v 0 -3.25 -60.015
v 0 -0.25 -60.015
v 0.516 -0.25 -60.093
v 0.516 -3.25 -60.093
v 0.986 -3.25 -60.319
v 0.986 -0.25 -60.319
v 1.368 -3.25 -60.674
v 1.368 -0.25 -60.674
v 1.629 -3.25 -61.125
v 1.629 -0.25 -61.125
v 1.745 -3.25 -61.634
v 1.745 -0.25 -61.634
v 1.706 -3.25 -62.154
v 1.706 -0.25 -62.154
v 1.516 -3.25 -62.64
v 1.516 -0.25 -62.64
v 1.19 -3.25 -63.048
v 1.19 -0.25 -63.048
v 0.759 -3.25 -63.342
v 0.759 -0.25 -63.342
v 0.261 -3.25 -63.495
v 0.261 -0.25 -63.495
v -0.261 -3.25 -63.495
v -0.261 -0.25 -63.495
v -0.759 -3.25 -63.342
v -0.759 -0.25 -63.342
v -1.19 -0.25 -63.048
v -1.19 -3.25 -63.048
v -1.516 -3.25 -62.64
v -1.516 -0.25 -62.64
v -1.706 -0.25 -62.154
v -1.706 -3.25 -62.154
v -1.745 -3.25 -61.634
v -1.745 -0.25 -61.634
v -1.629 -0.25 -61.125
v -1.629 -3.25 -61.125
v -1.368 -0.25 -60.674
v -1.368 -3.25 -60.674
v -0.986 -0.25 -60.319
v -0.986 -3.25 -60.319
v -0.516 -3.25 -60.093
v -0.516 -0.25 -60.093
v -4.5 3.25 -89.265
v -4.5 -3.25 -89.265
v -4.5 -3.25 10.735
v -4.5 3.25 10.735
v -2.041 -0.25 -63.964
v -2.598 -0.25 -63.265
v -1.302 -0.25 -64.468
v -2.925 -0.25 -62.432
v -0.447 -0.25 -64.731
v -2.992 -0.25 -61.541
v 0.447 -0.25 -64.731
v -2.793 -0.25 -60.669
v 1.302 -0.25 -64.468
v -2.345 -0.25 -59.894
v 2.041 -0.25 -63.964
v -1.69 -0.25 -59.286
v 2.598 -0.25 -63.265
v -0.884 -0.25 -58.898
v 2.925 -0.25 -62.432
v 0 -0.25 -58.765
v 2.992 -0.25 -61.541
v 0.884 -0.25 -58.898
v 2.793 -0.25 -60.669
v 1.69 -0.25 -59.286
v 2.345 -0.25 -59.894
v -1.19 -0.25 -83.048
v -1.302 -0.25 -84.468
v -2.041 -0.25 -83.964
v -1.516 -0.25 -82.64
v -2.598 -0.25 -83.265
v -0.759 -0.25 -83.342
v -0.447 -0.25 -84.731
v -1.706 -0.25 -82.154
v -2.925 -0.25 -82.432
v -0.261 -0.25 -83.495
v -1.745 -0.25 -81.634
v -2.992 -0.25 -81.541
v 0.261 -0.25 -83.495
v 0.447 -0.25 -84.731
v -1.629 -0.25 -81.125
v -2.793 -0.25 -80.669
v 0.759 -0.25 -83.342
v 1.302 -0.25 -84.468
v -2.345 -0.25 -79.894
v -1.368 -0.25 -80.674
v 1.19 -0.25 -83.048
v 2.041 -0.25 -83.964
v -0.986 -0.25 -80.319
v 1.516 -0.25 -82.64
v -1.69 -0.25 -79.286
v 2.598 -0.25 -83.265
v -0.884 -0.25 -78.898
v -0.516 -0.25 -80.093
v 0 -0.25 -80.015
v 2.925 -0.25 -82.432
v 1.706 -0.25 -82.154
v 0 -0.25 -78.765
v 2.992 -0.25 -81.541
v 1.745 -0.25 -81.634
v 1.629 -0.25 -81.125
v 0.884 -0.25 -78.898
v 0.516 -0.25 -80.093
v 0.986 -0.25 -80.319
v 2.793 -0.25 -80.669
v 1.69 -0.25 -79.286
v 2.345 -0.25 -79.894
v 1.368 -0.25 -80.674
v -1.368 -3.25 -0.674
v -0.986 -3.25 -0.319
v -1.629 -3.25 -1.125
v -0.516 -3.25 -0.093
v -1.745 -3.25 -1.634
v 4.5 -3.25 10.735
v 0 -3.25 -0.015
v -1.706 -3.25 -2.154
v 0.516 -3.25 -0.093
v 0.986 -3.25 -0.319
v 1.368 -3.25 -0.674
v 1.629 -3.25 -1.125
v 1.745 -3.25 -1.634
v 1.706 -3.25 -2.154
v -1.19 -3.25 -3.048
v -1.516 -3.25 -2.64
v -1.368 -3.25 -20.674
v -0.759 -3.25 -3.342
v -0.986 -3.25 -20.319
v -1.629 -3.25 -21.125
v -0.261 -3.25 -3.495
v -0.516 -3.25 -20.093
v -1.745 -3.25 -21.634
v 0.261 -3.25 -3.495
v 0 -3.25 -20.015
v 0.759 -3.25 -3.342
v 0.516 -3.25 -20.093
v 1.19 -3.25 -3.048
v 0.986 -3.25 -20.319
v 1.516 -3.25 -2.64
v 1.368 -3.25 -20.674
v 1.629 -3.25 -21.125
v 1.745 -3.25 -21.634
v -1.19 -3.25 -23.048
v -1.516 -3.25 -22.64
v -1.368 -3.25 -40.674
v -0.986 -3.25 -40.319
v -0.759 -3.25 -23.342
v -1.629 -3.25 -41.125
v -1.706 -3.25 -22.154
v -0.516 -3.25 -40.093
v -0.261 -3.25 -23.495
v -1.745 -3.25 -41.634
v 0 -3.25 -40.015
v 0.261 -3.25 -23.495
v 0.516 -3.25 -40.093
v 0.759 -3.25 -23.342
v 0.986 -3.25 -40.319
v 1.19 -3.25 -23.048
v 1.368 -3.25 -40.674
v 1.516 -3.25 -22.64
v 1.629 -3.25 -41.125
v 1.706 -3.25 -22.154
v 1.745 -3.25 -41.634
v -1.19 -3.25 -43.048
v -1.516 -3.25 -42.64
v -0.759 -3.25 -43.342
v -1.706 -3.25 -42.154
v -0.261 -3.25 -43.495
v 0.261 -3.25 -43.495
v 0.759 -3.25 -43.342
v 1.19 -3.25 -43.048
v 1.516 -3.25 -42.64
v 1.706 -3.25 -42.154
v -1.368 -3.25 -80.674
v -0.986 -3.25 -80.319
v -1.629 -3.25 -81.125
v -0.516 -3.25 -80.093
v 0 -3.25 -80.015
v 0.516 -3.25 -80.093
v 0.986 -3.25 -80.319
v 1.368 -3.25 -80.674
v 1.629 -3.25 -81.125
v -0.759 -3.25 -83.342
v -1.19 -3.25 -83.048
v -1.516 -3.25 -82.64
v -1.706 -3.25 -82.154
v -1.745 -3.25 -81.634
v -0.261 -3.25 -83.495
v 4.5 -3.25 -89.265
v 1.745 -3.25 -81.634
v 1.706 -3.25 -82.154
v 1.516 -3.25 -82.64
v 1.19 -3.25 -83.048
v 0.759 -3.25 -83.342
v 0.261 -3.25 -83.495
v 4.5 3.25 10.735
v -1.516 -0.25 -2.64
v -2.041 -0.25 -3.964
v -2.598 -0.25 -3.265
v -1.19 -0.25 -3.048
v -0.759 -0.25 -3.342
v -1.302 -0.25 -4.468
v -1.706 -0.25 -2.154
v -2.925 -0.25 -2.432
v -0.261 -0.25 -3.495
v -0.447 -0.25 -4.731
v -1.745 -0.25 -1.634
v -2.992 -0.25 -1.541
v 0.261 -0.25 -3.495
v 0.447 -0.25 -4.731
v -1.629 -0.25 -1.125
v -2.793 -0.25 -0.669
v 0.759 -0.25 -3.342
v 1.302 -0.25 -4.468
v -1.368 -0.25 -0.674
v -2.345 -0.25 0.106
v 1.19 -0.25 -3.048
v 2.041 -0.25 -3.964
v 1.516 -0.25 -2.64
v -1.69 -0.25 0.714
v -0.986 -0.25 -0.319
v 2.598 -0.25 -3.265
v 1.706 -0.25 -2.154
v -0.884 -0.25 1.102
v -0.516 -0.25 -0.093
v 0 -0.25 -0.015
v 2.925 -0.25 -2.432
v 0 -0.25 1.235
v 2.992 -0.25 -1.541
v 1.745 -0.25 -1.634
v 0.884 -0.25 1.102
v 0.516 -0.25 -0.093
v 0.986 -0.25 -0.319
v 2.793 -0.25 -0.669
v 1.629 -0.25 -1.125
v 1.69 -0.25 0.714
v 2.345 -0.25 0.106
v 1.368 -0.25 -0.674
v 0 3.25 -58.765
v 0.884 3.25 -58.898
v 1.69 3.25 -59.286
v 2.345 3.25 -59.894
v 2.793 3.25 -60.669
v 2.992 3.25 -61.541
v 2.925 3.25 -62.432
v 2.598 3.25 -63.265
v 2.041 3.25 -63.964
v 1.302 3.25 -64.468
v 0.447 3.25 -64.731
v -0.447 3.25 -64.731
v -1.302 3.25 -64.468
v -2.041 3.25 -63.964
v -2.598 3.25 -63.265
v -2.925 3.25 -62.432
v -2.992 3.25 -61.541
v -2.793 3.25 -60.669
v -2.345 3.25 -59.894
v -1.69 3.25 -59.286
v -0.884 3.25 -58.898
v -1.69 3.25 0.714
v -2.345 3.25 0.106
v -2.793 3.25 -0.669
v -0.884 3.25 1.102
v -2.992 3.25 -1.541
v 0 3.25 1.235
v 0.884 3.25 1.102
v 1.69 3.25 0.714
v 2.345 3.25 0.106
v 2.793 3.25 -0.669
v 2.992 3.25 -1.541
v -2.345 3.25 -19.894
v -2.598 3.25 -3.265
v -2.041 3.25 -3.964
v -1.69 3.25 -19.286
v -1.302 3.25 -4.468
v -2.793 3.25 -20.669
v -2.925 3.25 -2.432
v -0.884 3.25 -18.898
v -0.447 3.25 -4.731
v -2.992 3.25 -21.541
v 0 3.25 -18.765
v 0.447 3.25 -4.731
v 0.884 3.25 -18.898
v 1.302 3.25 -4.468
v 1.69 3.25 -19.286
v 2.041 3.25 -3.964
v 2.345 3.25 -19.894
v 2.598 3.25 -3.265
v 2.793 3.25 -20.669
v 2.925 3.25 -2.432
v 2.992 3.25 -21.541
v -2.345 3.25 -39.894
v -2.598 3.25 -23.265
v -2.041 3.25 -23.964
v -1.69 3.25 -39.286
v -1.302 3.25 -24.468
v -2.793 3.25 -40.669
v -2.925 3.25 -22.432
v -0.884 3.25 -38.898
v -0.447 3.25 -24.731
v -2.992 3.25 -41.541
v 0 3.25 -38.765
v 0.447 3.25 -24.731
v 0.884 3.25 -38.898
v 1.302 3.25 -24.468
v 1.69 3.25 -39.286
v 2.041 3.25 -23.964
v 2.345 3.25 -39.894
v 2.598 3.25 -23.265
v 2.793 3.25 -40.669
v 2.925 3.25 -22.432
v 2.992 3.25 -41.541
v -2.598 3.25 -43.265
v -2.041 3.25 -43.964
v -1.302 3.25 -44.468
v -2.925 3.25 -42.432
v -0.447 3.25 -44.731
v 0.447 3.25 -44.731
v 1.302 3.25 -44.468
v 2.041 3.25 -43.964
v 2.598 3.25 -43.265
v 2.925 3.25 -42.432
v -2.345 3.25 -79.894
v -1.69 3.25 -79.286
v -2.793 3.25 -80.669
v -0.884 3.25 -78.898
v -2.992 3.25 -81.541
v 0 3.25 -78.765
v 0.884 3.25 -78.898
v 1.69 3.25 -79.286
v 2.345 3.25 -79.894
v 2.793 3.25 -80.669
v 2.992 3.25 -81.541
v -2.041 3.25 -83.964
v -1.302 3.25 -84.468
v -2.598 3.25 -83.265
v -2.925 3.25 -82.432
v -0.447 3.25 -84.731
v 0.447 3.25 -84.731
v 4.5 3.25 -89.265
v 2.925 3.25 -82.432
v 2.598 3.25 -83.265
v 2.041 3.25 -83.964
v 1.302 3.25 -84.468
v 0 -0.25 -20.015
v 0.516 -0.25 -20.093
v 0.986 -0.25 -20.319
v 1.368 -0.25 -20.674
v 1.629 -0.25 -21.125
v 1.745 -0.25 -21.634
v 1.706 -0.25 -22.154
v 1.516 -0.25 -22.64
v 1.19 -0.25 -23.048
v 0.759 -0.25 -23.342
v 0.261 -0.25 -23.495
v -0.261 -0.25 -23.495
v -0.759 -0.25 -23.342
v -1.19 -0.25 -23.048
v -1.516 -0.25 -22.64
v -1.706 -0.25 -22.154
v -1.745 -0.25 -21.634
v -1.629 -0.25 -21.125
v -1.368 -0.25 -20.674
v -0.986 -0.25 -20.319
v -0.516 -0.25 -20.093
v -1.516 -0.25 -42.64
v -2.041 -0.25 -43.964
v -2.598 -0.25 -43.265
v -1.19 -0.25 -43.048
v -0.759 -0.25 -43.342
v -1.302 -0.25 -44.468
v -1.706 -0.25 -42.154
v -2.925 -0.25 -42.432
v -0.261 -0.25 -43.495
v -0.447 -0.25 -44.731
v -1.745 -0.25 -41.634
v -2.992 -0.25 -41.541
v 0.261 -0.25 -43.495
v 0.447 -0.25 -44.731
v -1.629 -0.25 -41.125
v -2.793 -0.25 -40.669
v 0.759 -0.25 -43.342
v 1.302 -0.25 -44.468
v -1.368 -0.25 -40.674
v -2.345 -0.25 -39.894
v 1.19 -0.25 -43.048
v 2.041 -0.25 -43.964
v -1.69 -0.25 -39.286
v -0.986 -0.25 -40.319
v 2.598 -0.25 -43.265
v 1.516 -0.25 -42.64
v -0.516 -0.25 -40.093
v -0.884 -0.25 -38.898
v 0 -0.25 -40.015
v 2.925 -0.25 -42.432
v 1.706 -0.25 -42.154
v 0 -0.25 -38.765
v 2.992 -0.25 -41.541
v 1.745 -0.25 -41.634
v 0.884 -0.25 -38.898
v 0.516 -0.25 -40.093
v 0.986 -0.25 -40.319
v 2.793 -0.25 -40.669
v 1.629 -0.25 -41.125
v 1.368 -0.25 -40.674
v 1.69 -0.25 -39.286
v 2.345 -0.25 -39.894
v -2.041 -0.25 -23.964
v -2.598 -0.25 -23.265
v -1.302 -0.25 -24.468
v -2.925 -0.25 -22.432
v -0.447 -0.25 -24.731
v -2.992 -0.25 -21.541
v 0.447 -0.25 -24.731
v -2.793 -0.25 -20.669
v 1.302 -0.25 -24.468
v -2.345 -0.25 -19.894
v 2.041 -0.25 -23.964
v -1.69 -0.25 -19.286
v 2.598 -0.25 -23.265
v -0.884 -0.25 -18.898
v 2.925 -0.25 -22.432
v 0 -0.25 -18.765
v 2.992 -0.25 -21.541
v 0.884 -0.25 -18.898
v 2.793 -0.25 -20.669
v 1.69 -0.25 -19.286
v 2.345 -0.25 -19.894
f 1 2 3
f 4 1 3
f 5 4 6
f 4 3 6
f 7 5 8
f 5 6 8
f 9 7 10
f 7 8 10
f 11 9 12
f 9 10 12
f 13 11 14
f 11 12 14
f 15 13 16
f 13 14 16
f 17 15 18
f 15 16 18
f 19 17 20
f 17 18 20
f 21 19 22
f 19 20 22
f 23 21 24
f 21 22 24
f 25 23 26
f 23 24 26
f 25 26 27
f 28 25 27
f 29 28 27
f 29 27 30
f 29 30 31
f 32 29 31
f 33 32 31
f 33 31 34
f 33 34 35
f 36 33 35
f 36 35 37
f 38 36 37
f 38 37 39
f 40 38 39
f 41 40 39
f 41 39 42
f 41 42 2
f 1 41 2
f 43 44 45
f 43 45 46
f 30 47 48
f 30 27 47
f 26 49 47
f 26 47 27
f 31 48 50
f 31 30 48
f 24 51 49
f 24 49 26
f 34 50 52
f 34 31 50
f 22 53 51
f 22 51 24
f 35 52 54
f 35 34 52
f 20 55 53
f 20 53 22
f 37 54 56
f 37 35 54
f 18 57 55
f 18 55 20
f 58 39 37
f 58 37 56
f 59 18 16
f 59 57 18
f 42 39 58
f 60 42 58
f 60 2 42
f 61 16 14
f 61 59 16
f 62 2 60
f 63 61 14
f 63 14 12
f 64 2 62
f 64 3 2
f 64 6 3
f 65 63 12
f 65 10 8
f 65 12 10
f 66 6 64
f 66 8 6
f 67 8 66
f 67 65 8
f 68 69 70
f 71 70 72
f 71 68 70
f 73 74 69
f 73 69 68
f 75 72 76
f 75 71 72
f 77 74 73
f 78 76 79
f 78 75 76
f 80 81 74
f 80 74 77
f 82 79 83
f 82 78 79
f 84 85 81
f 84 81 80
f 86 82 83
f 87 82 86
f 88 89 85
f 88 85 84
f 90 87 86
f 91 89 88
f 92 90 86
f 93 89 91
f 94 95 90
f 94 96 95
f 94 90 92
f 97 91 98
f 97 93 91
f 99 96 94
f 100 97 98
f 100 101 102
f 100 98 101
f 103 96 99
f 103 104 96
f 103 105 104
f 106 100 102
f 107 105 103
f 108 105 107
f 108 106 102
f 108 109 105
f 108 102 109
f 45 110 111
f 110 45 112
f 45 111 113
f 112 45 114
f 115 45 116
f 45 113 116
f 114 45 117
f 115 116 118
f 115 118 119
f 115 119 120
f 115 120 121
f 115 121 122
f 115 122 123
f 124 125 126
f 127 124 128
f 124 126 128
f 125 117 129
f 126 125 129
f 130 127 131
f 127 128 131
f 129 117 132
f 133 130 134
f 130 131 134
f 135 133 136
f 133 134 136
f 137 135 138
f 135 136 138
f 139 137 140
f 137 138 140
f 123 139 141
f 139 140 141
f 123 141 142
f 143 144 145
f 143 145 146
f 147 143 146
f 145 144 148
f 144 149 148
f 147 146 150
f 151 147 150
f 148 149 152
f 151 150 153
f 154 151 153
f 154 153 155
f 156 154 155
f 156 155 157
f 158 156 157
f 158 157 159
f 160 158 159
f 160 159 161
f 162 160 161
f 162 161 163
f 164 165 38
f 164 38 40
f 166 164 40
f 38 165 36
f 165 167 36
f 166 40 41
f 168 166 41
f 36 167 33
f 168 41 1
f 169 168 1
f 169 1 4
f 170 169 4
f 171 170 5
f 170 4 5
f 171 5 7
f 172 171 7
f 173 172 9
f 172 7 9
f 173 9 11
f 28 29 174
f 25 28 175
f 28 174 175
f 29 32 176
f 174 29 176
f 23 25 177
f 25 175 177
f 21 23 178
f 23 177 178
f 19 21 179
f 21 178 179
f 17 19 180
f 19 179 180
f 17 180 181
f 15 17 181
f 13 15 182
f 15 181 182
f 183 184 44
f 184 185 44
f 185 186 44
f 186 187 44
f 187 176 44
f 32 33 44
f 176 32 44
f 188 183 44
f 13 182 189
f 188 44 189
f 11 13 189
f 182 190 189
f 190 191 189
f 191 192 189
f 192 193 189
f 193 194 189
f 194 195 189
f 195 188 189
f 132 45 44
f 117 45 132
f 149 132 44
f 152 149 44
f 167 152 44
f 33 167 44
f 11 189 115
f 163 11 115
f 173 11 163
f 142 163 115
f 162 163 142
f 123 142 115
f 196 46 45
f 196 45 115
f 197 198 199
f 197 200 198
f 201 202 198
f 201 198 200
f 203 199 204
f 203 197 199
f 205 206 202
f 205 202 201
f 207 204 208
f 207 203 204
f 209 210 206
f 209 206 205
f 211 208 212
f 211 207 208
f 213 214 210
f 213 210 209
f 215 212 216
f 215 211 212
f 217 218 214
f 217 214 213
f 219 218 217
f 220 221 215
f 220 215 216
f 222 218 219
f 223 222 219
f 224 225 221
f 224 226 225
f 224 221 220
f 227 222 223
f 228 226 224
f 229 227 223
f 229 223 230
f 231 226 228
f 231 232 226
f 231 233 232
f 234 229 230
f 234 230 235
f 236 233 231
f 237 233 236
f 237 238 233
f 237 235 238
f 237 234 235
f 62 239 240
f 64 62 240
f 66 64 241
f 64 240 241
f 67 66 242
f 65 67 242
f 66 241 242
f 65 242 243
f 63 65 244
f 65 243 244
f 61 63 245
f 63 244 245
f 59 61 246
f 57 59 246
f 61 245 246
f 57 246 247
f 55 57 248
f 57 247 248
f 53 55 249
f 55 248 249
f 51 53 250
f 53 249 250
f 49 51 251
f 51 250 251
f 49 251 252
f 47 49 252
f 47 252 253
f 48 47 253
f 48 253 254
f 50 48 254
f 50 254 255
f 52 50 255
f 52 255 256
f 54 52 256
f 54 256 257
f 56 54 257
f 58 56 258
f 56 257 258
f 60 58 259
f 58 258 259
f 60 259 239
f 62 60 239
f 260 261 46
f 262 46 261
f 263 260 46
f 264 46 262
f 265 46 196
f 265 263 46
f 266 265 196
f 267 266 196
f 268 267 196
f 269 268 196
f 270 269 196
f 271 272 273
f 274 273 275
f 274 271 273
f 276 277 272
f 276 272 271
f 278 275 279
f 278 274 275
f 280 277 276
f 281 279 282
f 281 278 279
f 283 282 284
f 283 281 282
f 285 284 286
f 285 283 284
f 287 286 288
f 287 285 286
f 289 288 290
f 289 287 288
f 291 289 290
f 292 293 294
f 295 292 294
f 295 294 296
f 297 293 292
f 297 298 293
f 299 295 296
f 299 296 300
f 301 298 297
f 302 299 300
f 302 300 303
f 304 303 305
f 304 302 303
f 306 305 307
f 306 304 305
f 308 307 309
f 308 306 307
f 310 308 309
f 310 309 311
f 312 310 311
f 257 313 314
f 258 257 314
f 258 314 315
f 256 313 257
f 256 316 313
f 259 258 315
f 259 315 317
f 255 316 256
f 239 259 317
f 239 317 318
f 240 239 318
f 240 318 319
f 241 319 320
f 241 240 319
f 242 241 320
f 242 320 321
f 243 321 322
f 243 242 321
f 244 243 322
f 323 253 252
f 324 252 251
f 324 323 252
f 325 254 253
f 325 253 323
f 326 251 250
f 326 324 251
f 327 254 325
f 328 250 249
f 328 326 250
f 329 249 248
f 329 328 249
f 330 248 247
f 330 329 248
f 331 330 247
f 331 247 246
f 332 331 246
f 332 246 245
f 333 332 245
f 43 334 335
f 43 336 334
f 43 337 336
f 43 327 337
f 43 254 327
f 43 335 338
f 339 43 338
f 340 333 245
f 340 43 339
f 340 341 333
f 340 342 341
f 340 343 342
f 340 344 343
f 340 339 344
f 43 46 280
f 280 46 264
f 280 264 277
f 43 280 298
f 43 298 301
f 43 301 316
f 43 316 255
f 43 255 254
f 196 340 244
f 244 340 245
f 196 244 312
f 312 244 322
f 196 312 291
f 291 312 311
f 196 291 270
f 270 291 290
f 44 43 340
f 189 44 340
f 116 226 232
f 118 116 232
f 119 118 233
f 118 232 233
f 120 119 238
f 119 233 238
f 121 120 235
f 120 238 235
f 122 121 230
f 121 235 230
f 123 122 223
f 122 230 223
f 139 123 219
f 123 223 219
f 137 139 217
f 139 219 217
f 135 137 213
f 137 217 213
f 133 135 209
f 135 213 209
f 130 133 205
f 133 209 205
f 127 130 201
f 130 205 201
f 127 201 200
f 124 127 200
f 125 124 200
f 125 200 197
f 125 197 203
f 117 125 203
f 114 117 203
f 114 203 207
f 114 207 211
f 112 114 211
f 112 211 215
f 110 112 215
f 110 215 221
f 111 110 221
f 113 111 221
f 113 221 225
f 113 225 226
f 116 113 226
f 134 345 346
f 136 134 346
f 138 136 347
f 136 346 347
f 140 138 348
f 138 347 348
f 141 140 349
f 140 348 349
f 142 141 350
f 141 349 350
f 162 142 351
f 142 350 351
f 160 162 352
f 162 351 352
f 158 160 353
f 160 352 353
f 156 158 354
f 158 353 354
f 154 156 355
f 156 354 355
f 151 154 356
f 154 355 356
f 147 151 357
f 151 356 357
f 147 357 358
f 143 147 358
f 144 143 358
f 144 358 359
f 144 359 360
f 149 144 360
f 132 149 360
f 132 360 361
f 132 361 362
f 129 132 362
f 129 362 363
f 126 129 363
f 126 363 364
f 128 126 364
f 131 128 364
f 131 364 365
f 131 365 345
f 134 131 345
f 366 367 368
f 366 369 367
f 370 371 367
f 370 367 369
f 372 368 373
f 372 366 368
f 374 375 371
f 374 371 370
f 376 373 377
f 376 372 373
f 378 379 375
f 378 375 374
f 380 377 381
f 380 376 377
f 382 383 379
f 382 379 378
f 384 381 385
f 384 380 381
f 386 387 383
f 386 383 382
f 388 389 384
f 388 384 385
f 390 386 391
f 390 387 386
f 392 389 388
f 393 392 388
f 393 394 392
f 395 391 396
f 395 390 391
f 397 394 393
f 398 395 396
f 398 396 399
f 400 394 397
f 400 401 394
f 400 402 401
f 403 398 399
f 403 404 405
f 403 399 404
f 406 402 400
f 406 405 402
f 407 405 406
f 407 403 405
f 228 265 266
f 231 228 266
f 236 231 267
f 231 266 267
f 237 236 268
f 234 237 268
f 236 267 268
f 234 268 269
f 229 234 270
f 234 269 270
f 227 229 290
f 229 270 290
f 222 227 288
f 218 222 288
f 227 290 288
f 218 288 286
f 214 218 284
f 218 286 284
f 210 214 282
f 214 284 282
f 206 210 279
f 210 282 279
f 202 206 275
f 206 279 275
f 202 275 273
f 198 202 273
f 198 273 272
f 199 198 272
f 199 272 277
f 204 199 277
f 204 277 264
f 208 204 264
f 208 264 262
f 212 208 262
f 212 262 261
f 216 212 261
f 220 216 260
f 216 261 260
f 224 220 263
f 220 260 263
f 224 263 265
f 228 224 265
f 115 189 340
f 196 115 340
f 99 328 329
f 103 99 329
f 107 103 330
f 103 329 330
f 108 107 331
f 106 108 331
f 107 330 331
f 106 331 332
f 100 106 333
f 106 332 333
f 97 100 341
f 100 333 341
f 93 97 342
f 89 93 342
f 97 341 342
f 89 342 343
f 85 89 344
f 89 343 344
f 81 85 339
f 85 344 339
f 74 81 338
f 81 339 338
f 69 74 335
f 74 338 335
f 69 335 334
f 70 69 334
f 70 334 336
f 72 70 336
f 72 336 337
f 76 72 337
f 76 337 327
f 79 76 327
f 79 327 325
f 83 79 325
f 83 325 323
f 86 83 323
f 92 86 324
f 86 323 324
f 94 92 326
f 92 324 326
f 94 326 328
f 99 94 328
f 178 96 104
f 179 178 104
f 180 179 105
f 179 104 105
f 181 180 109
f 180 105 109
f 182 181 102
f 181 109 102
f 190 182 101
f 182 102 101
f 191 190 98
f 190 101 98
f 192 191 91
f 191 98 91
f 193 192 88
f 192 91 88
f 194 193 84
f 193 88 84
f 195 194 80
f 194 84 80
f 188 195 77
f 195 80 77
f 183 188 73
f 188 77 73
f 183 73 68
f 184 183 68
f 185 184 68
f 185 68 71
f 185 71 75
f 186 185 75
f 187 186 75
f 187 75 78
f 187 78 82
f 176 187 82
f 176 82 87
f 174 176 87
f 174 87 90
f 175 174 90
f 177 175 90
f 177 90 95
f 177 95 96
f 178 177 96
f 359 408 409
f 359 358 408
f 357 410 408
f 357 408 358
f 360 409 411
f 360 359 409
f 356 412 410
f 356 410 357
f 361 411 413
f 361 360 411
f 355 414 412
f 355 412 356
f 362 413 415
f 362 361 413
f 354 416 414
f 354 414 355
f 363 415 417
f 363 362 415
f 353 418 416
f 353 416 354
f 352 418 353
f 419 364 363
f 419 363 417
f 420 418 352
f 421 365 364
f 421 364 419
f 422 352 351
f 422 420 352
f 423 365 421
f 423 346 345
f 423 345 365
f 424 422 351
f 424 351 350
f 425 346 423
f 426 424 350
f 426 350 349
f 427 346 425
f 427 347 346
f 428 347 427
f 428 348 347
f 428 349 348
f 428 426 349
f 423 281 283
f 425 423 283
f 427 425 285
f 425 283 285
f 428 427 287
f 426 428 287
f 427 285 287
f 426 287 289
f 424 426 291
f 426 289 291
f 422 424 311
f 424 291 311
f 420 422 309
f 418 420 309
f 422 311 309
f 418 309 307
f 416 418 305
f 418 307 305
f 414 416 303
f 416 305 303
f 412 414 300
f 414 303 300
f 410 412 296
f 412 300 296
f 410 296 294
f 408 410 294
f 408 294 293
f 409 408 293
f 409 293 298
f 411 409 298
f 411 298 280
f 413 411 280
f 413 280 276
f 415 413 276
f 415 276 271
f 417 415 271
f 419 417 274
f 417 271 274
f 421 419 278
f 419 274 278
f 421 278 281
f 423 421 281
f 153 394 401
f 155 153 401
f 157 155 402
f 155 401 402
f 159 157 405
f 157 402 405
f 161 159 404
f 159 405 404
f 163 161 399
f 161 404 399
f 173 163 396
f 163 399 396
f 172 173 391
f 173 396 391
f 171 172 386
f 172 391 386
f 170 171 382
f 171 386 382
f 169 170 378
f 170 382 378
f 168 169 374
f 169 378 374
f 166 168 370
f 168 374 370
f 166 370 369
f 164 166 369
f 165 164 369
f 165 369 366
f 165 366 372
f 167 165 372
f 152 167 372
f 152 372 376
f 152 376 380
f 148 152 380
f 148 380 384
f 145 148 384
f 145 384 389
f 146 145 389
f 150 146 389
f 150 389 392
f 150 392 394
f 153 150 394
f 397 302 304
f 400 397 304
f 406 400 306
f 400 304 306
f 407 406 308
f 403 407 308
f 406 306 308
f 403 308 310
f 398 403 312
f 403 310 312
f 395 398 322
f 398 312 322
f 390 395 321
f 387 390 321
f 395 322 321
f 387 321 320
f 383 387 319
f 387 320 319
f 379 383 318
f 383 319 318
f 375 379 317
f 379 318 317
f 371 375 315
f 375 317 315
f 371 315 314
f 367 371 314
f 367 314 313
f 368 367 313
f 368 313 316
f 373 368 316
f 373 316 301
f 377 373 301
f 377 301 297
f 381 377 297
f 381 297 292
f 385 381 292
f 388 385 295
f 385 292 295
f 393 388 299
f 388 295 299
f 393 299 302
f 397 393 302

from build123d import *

# Parameters (mm, degrees)
SKETCH_1_W          = 9
SKETCH_1_H          = 6.5
EXTRUDE_1_DEPTH     = 100
SKETCH_2_R          = 1.750000006
CUT_EXTRUDE_1_DEPTH = 90.614230596
SKETCH_3_R          = 3.000000006
CUT_EXTRUDE_2_DEPTH = 3.5


with BuildPart() as part:
    # 草图1 → 凸台-拉伸1 (new body)
    with BuildSketch(Plane.XY.offset(-89.264832522)):
        Rectangle(SKETCH_1_W, SKETCH_1_H)
    extrude(amount=EXTRUDE_1_DEPTH)

    # 草图2 → 切除-拉伸1 (cut, through all)
    with BuildSketch(Plane(origin=(0, 3.25, 0), x_dir=(1, 0, 0), z_dir=(0, 1, 0))):
        with Locations(Location((0, 81.764832522, 0), (0, 0, 270))):
            Circle(SKETCH_2_R)
        with Locations(Location((0, 61.764832522, 0), (0, 0, 270))):
            Circle(SKETCH_2_R)
        with Locations(Location((0, 41.764832522, 0), (0, 0, 270))):
            Circle(SKETCH_2_R)
        with Locations(Location((0, 21.764832522, 0), (0, 0, 270))):
            Circle(SKETCH_2_R)
        with Locations(Location((0, 1.764832522, 0), (0, 0, 270))):
            Circle(SKETCH_2_R)
        with Locations((0, -18.235167478)):
            Circle(SKETCH_2_R)
        with Locations((0, -38.235167478)):
            Circle(SKETCH_2_R)
        with Locations((0, -58.235167478)):
            Circle(SKETCH_2_R)
        with Locations((0, -78.235167478)):
            Circle(SKETCH_2_R)
        with Locations((0, -98.235167478)):
            Circle(SKETCH_2_R)
        with Locations((0, -118.235167478)):
            Circle(SKETCH_2_R)
        with Locations((0, -138.235167478)):
            Circle(SKETCH_2_R)
        with Locations((0, -158.235167478)):
            Circle(SKETCH_2_R)
        with Locations((0, -178.235167478)):
            Circle(SKETCH_2_R)
        with Locations((0, -198.235167478)):
            Circle(SKETCH_2_R)
        with Locations((0, -218.235167478)):
            Circle(SKETCH_2_R)
        with Locations((0, -238.235167478)):
            Circle(SKETCH_2_R)
        with Locations((0, -258.235167478)):
            Circle(SKETCH_2_R)
        with Locations((0, -278.235167478)):
            Circle(SKETCH_2_R)
        with Locations((0, -298.235167478)):
            Circle(SKETCH_2_R)
        with Locations((0, -318.235167478)):
            Circle(SKETCH_2_R)
        with Locations((0, -338.235167478)):
            Circle(SKETCH_2_R)
        with Locations((0, -358.235167478)):
            Circle(SKETCH_2_R)
        with Locations((0, -378.235167478)):
            Circle(SKETCH_2_R)
        with Locations((0, -398.235167478)):
            Circle(SKETCH_2_R)
        with Locations((0, -418.235167478)):
            Circle(SKETCH_2_R)
        with Locations((0, -438.235167478)):
            Circle(SKETCH_2_R)
        with Locations((0, -458.235167478)):
            Circle(SKETCH_2_R)
        with Locations((0, -478.235167478)):
            Circle(SKETCH_2_R)
        with Locations((0, -498.235167478)):
            Circle(SKETCH_2_R)
        with Locations((0, -518.235167478)):
            Circle(SKETCH_2_R)
        with Locations((0, -538.235167478)):
            Circle(SKETCH_2_R)
        with Locations((0, -558.235167478)):
            Circle(SKETCH_2_R)
        with Locations((0, -578.235167478)):
            Circle(SKETCH_2_R)
        with Locations((0, -598.235167478)):
            Circle(SKETCH_2_R)
        with Locations((0, -618.235167478)):
            Circle(SKETCH_2_R)
        with Locations((0, -638.235167478)):
            Circle(SKETCH_2_R)
        with Locations((0, -658.235167478)):
            Circle(SKETCH_2_R)
        with Locations((0, -678.235167478)):
            Circle(SKETCH_2_R)
        with Locations((0, -698.235167478)):
            Circle(SKETCH_2_R)
        with Locations((0, -718.235167478)):
            Circle(SKETCH_2_R)
        with Locations((0, -738.235167478)):
            Circle(SKETCH_2_R)
        with Locations((0, -758.235167478)):
            Circle(SKETCH_2_R)
        with Locations((0, -778.235167478)):
            Circle(SKETCH_2_R)
        with Locations((0, -798.235167478)):
            Circle(SKETCH_2_R)
        with Locations((0, -818.235167478)):
            Circle(SKETCH_2_R)
        with Locations((0, -838.235167478)):
            Circle(SKETCH_2_R)
        with Locations((0, -858.235167478)):
            Circle(SKETCH_2_R)
        with Locations((0, -878.235167478)):
            Circle(SKETCH_2_R)
        with Locations((0, -898.235167478)):
            Circle(SKETCH_2_R)
        with Locations((0, -918.235167478)):
            Circle(SKETCH_2_R)
        with Locations((0, -938.235167478)):
            Circle(SKETCH_2_R)
        with Locations((0, -958.235167478)):
            Circle(SKETCH_2_R)
        with Locations((0, -978.235167478)):
            Circle(SKETCH_2_R)
        with Locations((0, -998.235167478)):
            Circle(SKETCH_2_R)
        with Locations((0, -1018.235167478)):
            Circle(SKETCH_2_R)
        with Locations((0, -1038.235167478)):
            Circle(SKETCH_2_R)
        with Locations((0, -1058.235167478)):
            Circle(SKETCH_2_R)
        with Locations((0, -1078.235167478)):
            Circle(SKETCH_2_R)
        with Locations((0, -1098.235167478)):
            Circle(SKETCH_2_R)
    extrude(amount=-CUT_EXTRUDE_1_DEPTH, mode=Mode.SUBTRACT)

    # 草图3 → 切除-拉伸2 (cut)
    with BuildSketch(Plane(origin=(0, 3.25, 0), x_dir=(1, 0, 0), z_dir=(0, 1, 0))):
        with Locations(Location((0, 81.764832522, 0), (0, 0, 270))):
            Circle(SKETCH_3_R)
        with Locations(Location((0, 61.764832522, 0), (0, 0, 270))):
            Circle(SKETCH_3_R)
        with Locations(Location((0, 41.764832522, 0), (0, 0, 270))):
            Circle(SKETCH_3_R)
        with Locations(Location((0, 21.764832522, 0), (0, 0, 270))):
            Circle(SKETCH_3_R)
        with Locations(Location((0, 1.764832522, 0), (0, 0, 270))):
            Circle(SKETCH_3_R)
        with Locations((0, -18.235167478)):
            Circle(SKETCH_3_R)
        with Locations((0, -38.235167478)):
            Circle(SKETCH_3_R)
        with Locations((0, -58.235167478)):
            Circle(SKETCH_3_R)
        with Locations((0, -78.235167478)):
            Circle(SKETCH_3_R)
        with Locations((0, -98.235167478)):
            Circle(SKETCH_3_R)
        with Locations((0, -118.235167478)):
            Circle(SKETCH_3_R)
        with Locations((0, -138.235167478)):
            Circle(SKETCH_3_R)
        with Locations((0, -158.235167478)):
            Circle(SKETCH_3_R)
        with Locations((0, -178.235167478)):
            Circle(SKETCH_3_R)
        with Locations((0, -198.235167478)):
            Circle(SKETCH_3_R)
        with Locations((0, -218.235167478)):
            Circle(SKETCH_3_R)
        with Locations((0, -238.235167478)):
            Circle(SKETCH_3_R)
        with Locations((0, -258.235167478)):
            Circle(SKETCH_3_R)
        with Locations((0, -278.235167478)):
            Circle(SKETCH_3_R)
        with Locations((0, -298.235167478)):
            Circle(SKETCH_3_R)
        with Locations((0, -318.235167478)):
            Circle(SKETCH_3_R)
        with Locations((0, -338.235167478)):
            Circle(SKETCH_3_R)
        with Locations((0, -358.235167478)):
            Circle(SKETCH_3_R)
        with Locations((0, -378.235167478)):
            Circle(SKETCH_3_R)
        with Locations((0, -398.235167478)):
            Circle(SKETCH_3_R)
        with Locations((0, -418.235167478)):
            Circle(SKETCH_3_R)
        with Locations((0, -438.235167478)):
            Circle(SKETCH_3_R)
        with Locations((0, -458.235167478)):
            Circle(SKETCH_3_R)
        with Locations((0, -478.235167478)):
            Circle(SKETCH_3_R)
        with Locations((0, -498.235167478)):
            Circle(SKETCH_3_R)
        with Locations((0, -518.235167478)):
            Circle(SKETCH_3_R)
        with Locations((0, -538.235167478)):
            Circle(SKETCH_3_R)
        with Locations((0, -558.235167478)):
            Circle(SKETCH_3_R)
        with Locations((0, -578.235167478)):
            Circle(SKETCH_3_R)
        with Locations((0, -598.235167478)):
            Circle(SKETCH_3_R)
        with Locations((0, -618.235167478)):
            Circle(SKETCH_3_R)
        with Locations((0, -638.235167478)):
            Circle(SKETCH_3_R)
        with Locations((0, -658.235167478)):
            Circle(SKETCH_3_R)
        with Locations((0, -678.235167478)):
            Circle(SKETCH_3_R)
        with Locations((0, -698.235167478)):
            Circle(SKETCH_3_R)
        with Locations((0, -718.235167478)):
            Circle(SKETCH_3_R)
        with Locations((0, -738.235167478)):
            Circle(SKETCH_3_R)
        with Locations((0, -758.235167478)):
            Circle(SKETCH_3_R)
        with Locations((0, -778.235167478)):
            Circle(SKETCH_3_R)
        with Locations((0, -798.235167478)):
            Circle(SKETCH_3_R)
        with Locations((0, -818.235167478)):
            Circle(SKETCH_3_R)
        with Locations((0, -838.235167478)):
            Circle(SKETCH_3_R)
        with Locations((0, -858.235167478)):
            Circle(SKETCH_3_R)
        with Locations((0, -878.235167478)):
            Circle(SKETCH_3_R)
        with Locations((0, -898.235167478)):
            Circle(SKETCH_3_R)
        with Locations((0, -918.235167478)):
            Circle(SKETCH_3_R)
        with Locations((0, -938.235167478)):
            Circle(SKETCH_3_R)
        with Locations((0, -958.235167478)):
            Circle(SKETCH_3_R)
        with Locations((0, -978.235167478)):
            Circle(SKETCH_3_R)
        with Locations((0, -998.235167478)):
            Circle(SKETCH_3_R)
        with Locations((0, -1018.235167478)):
            Circle(SKETCH_3_R)
        with Locations((0, -1038.235167478)):
            Circle(SKETCH_3_R)
        with Locations((0, -1058.235167478)):
            Circle(SKETCH_3_R)
        with Locations((0, -1078.235167478)):
            Circle(SKETCH_3_R)
        with Locations((0, -1098.235167478)):
            Circle(SKETCH_3_R)
    extrude(amount=-CUT_EXTRUDE_2_DEPTH, mode=Mode.SUBTRACT)


solid = part.part
